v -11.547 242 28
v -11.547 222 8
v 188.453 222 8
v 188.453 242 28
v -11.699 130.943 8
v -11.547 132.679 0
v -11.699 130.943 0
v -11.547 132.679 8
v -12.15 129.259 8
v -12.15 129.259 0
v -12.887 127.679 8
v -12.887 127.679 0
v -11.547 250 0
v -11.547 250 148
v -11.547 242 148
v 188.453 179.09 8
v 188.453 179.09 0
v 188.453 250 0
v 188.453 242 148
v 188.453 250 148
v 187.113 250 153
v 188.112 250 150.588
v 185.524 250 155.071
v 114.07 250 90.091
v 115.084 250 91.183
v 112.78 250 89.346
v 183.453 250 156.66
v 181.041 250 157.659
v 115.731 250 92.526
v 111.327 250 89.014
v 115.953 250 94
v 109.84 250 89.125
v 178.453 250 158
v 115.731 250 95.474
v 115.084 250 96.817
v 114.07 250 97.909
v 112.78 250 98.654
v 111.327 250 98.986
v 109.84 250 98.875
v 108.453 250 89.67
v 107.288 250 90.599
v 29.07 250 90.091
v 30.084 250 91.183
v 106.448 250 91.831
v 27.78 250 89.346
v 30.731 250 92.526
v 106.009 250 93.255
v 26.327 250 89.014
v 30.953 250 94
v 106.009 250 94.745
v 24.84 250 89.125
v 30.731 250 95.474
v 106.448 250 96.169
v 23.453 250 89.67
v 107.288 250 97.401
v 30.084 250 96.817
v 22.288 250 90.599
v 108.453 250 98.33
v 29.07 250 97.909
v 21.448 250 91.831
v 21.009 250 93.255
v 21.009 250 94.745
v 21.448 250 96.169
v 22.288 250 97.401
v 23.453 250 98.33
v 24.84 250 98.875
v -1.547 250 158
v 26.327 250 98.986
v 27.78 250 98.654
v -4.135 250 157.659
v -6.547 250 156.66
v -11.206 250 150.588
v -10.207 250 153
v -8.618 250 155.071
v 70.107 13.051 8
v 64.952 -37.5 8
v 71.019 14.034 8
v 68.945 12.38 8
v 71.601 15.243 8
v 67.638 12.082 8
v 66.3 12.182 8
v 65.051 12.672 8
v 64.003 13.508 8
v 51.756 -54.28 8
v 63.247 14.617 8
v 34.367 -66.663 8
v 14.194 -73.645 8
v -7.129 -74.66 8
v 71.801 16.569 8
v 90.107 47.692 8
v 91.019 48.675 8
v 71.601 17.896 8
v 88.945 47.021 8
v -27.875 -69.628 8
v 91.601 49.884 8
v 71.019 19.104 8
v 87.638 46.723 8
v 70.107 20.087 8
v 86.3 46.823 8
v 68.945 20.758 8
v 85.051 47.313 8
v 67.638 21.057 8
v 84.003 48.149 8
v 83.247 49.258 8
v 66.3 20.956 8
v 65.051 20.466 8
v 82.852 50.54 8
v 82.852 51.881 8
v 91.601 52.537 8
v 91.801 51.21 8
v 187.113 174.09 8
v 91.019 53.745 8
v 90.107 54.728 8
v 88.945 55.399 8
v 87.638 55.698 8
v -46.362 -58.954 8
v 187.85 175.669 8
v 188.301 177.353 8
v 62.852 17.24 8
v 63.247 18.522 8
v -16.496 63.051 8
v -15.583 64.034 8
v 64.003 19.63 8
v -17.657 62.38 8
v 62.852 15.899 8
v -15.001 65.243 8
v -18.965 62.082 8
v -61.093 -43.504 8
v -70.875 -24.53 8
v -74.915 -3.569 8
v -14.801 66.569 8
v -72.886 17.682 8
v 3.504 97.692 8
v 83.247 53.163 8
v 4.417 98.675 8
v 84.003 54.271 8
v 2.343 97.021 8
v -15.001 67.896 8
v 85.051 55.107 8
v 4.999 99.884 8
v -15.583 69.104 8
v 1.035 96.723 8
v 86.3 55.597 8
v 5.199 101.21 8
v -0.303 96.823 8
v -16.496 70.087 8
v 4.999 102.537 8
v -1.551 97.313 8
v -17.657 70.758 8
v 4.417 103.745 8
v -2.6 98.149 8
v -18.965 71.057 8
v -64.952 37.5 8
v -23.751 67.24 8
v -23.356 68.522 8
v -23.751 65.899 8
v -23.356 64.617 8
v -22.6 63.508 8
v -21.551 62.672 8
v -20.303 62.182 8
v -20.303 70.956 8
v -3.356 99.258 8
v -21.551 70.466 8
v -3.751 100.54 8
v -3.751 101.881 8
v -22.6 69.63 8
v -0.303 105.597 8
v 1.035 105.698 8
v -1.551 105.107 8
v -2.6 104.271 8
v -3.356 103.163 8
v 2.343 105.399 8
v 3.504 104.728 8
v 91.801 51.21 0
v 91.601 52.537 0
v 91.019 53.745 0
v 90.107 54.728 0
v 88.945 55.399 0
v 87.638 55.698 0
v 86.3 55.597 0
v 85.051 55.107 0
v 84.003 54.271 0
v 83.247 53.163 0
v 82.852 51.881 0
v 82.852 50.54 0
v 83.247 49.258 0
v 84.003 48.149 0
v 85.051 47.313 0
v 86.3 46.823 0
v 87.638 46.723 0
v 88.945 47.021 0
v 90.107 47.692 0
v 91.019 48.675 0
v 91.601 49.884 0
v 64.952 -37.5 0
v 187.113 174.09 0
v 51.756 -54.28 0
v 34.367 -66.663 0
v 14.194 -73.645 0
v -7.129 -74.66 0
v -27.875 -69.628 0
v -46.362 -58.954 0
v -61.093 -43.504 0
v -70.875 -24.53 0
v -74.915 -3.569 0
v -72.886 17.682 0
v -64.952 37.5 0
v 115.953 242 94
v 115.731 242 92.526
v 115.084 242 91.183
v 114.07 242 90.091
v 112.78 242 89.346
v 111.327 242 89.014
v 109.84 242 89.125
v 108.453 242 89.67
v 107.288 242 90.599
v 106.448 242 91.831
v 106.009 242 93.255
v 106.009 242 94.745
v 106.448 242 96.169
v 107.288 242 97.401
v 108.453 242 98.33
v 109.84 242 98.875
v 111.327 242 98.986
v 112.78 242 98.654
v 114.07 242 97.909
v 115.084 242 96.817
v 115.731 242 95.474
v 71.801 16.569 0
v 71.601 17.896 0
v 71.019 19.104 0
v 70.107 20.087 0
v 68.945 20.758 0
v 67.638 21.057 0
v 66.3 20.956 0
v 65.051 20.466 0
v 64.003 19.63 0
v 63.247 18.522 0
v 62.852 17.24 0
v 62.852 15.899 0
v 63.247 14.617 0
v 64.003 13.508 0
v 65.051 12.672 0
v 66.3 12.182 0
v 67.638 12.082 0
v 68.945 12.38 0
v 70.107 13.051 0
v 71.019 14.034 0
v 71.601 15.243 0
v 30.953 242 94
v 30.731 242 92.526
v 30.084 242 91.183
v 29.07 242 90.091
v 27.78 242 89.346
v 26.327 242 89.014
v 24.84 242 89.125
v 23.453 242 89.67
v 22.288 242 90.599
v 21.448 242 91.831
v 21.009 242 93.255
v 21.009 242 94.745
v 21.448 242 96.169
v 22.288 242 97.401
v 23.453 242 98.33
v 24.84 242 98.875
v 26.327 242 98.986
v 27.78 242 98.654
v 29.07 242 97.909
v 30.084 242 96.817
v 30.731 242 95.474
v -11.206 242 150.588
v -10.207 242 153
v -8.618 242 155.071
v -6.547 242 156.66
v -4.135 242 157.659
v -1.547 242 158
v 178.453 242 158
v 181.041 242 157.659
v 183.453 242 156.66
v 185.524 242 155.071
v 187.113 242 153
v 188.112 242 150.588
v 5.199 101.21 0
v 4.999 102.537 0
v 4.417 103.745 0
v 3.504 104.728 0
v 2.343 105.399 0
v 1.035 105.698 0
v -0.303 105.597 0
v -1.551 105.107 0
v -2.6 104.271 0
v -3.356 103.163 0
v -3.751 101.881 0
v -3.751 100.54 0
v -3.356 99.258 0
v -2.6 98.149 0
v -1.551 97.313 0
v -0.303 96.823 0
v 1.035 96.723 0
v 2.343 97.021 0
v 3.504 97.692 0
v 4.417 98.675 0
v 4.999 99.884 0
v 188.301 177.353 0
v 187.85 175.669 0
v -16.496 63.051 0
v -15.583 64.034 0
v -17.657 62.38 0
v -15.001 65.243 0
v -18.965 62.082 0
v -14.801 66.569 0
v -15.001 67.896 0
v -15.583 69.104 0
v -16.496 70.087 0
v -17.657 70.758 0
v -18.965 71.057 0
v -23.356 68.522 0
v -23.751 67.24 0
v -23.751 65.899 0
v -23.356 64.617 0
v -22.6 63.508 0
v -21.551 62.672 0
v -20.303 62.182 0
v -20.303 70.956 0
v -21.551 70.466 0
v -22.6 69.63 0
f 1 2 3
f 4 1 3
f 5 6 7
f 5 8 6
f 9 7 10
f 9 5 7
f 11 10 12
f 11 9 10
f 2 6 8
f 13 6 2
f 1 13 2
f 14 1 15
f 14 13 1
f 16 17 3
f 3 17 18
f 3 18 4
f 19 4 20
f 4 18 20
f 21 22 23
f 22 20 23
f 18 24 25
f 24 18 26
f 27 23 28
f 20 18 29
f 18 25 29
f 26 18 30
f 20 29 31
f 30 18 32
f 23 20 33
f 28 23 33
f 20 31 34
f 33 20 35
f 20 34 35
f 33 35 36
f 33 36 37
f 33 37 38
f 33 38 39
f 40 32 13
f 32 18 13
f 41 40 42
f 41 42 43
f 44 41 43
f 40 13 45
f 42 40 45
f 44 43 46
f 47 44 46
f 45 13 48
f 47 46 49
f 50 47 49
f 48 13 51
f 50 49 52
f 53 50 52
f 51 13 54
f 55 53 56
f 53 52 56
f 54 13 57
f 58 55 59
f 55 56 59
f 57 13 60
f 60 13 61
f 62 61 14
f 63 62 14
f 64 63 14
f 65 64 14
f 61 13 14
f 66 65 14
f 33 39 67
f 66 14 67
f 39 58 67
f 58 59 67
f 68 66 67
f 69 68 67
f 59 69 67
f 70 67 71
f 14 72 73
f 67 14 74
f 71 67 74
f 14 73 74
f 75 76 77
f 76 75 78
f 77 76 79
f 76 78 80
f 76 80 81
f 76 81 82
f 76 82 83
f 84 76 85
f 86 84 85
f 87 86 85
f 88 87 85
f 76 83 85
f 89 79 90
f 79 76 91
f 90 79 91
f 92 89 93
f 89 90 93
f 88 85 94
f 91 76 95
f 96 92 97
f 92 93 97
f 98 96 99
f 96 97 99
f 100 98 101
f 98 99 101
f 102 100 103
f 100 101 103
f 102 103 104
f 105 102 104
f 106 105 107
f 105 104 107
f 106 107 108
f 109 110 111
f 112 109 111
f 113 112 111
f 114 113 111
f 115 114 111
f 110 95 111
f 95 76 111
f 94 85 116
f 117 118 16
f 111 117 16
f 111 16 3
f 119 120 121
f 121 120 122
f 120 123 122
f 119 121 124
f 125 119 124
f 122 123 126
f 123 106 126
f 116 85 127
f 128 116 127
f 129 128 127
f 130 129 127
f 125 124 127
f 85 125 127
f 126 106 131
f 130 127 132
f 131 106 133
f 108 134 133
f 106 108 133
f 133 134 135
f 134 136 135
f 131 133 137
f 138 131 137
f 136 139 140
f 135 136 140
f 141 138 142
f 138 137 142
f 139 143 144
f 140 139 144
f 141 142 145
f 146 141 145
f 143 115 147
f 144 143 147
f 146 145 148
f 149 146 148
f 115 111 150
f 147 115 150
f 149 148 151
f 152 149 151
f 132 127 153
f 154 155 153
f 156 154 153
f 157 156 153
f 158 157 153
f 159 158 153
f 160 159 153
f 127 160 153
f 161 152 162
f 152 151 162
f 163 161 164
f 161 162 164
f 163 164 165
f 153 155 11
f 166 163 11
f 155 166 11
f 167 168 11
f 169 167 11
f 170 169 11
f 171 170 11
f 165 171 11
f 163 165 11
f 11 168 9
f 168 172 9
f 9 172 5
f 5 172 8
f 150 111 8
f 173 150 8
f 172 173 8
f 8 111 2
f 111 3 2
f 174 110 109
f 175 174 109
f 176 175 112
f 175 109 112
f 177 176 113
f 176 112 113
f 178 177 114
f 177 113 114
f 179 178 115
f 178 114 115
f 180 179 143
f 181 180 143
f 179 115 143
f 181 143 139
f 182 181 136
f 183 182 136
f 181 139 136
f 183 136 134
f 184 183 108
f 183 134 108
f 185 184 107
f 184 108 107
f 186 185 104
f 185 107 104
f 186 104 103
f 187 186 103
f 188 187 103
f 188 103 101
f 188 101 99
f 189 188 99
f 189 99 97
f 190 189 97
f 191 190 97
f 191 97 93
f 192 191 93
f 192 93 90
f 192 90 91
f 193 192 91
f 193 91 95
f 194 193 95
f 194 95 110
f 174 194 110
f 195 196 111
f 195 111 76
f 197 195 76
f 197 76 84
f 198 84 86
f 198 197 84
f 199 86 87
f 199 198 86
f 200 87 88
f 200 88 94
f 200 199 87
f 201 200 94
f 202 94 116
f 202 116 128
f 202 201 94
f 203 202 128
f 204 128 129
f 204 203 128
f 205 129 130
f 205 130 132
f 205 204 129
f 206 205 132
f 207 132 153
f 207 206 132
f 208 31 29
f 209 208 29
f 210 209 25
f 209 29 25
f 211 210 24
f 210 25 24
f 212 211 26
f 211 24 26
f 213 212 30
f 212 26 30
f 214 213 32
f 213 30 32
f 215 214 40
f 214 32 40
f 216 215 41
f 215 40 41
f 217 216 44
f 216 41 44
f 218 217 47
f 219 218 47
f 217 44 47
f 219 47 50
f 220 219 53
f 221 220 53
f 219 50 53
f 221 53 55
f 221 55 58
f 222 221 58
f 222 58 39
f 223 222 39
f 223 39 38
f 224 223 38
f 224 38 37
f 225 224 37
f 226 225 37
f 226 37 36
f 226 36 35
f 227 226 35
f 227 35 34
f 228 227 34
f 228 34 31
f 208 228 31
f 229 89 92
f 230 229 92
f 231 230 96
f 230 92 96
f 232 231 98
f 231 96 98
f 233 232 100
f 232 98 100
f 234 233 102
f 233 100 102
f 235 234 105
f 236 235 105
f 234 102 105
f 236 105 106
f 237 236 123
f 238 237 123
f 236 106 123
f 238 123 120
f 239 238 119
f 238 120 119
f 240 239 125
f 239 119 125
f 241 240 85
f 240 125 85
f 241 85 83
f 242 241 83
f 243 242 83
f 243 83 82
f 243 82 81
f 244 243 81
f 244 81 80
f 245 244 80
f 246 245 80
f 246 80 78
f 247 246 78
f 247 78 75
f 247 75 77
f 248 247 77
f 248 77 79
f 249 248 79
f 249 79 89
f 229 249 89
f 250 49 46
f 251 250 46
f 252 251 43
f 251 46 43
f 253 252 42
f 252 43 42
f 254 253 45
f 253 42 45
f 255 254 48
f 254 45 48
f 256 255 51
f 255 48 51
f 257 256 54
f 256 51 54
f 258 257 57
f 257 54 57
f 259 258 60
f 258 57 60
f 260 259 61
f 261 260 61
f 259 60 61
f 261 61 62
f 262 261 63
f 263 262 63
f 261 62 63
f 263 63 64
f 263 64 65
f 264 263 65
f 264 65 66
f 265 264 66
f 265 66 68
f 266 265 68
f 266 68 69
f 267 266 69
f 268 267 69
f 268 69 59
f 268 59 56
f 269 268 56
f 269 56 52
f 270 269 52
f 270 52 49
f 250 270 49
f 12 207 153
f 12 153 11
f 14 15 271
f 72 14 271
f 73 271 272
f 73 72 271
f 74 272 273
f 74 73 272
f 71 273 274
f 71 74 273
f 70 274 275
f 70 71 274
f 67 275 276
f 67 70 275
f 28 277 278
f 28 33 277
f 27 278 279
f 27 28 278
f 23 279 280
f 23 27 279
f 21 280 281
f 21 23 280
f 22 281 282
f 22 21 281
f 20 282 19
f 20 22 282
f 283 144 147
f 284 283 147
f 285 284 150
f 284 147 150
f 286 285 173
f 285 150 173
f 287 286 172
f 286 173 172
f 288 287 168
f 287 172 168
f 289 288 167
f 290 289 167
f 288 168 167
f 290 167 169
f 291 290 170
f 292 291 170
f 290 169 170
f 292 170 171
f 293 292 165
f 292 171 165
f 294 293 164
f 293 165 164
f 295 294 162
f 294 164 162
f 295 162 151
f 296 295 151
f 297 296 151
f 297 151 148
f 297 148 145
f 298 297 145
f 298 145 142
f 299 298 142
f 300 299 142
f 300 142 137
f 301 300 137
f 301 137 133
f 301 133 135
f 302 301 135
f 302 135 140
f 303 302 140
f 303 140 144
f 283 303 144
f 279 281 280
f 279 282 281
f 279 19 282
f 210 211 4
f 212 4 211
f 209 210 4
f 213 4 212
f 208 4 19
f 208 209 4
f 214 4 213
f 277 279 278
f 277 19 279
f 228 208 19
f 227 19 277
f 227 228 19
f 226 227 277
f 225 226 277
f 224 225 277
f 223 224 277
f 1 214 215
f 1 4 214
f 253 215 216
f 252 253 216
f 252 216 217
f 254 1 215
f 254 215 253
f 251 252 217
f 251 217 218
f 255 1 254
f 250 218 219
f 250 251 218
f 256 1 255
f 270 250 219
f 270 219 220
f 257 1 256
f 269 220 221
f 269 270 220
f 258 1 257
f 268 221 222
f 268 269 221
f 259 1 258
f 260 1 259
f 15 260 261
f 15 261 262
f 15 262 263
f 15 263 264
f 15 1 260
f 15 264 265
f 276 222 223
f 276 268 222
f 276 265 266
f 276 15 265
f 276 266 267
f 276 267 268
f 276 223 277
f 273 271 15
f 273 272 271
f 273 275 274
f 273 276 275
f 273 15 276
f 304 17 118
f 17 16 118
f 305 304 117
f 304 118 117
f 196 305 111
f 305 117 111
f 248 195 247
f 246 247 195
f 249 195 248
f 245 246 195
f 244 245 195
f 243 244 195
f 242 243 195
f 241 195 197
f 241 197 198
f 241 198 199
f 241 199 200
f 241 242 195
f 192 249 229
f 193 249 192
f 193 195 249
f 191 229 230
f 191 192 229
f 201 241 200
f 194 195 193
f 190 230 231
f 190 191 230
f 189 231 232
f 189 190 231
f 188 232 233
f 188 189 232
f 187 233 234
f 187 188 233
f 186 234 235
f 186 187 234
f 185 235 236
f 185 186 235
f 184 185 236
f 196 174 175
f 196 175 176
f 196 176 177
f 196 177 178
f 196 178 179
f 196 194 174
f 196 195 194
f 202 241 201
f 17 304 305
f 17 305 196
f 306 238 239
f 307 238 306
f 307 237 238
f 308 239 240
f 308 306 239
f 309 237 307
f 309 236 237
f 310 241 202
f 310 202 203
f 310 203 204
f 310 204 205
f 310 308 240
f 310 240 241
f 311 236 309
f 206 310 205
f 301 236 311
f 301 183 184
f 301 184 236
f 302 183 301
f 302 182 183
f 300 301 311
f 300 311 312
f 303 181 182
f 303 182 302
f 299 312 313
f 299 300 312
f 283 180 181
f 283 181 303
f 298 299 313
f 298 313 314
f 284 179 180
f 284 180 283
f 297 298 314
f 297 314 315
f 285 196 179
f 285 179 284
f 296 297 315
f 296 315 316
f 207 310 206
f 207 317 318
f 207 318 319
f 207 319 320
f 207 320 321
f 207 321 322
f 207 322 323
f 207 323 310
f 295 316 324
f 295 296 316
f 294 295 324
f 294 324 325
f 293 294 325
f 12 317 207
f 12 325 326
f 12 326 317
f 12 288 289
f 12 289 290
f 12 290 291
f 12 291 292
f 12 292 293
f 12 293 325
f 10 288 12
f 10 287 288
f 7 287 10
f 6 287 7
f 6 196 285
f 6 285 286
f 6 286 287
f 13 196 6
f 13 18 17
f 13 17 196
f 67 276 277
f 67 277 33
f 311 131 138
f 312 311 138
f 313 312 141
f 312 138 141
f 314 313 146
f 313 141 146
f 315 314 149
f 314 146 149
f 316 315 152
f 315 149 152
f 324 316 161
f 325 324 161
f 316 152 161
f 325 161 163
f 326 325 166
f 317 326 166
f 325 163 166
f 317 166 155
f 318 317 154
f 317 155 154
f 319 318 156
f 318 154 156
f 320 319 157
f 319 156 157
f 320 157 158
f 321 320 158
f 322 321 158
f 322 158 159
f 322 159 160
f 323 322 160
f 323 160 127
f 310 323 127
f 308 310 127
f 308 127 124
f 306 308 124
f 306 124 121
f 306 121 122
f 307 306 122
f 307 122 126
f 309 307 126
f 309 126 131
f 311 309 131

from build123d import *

# Parameters (mm, degrees)
BOSS_EXTRUDE1_DEPTH = 8
SKETCH4_W           = 150
SKETCH4_H           = 8
BOSS_EXTRUDE2_DEPTH = 200
CHAMFER1_SIZE       = 20
CUT_EXTRUDE1_REACH  = 327
SKETCH5_R           = 5
CUT_EXTRUDE2_REACH  = 10
SKETCH6_R           = 4.5
FILLET1_R           = 10


with BuildPart() as part:
    # Sketch1 → Boss-Extrude1 (new body)
    with BuildSketch(Plane.XY):
        with BuildLine():
            Line((-64.951905284, 37.5), (-11.547005384, 130))
            Line((-11.547005384, 130), (-11.547005384, 250))
            Line((-11.547005384, 250), (188.452994616, 250))
            Line((188.452994616, 250), (188.452994616, 176.410161514))
            Line((188.452994616, 176.410161514), (64.951905284, -37.5))
            ThreePointArc((64.951905284, -37.5), (-37.5, -64.951905284), (-64.951905284, 37.5))
        make_face()
    extrude(amount=BOSS_EXTRUDE1_DEPTH)

    # Sketch4 → Boss-Extrude2 (add)
    with BuildSketch(Plane.ZY.offset(11.547005384)):
        with Locations((83, 246)):
            Rectangle(SKETCH4_W, SKETCH4_H)
    extrude(amount=-BOSS_EXTRUDE2_DEPTH)

    # Chamfer1
    chamfer1_edges = [part.edges().sort_by_distance(p)[0] for p in [
        (88.452994616, 242, 8),
    ]]
    chamfer(chamfer1_edges, length=CHAMFER1_SIZE)

    # Sketch5 → Cut-Extrude1 (cut, up to next)
    with BuildSketch(Plane(origin=(0, 250, 0), x_dir=(1, 0, 0), z_dir=(0, 1, 0)), mode=Mode.PRIVATE) as cut_extrude1_sk1:
        with Locations((25.952994616, -94)):
            Circle(SKETCH5_R)
    cut_extrude1_tool1 = extrude(cut_extrude1_sk1.sketch, amount=-CUT_EXTRUDE1_REACH, mode=Mode.PRIVATE) & part.part
    add(cut_extrude1_tool1.solids().sort_by_distance((25.952995, 250, 94))[0], mode=Mode.SUBTRACT)
    # Sketch5 → Cut-Extrude1 (cut, up to next)
    with BuildSketch(Plane(origin=(0, 250, 0), x_dir=(1, 0, 0), z_dir=(0, 1, 0)), mode=Mode.PRIVATE) as cut_extrude1_sk2:
        with Locations((110.952994616, -94)):
            Circle(SKETCH5_R)
    cut_extrude1_tool2 = extrude(cut_extrude1_sk2.sketch, amount=-CUT_EXTRUDE1_REACH, mode=Mode.PRIVATE) & part.part
    add(cut_extrude1_tool2.solids().sort_by_distance((110.952995, 250, 94))[0], mode=Mode.SUBTRACT)

    # Sketch6 → Cut-Extrude2 (cut, up to next)
    with BuildSketch(Plane.XY.offset(8), mode=Mode.PRIVATE) as cut_extrude2_sk1:
        with Locations((0.698729811, 101.210235533)):
            Circle(SKETCH6_R)
    cut_extrude2_tool1 = extrude(cut_extrude2_sk1.sketch, amount=-CUT_EXTRUDE2_REACH, mode=Mode.PRIVATE) & part.part
    add(cut_extrude2_tool1.solids().sort_by_distance((0.69873, 101.210236, 8))[0], mode=Mode.SUBTRACT)
    # Sketch6 → Cut-Extrude2 (cut, up to next)
    with BuildSketch(Plane.XY.offset(8), mode=Mode.PRIVATE) as cut_extrude2_sk2:
        with Locations((87.301270189, 51.210235533)):
            Circle(SKETCH6_R)
    cut_extrude2_tool2 = extrude(cut_extrude2_sk2.sketch, amount=-CUT_EXTRUDE2_REACH, mode=Mode.PRIVATE) & part.part
    add(cut_extrude2_tool2.solids().sort_by_distance((87.30127, 51.210236, 8))[0], mode=Mode.SUBTRACT)
    # Sketch6 → Cut-Extrude2 (cut, up to next)
    with BuildSketch(Plane.XY.offset(8), mode=Mode.PRIVATE) as cut_extrude2_sk3:
        with Locations((67.301270189, 16.569219382)):
            Circle(SKETCH6_R)
    cut_extrude2_tool3 = extrude(cut_extrude2_sk3.sketch, amount=-CUT_EXTRUDE2_REACH, mode=Mode.PRIVATE) & part.part
    add(cut_extrude2_tool3.solids().sort_by_distance((67.30127, 16.569219, 8))[0], mode=Mode.SUBTRACT)
    # Sketch6 → Cut-Extrude2 (cut, up to next)
    with BuildSketch(Plane.XY.offset(8), mode=Mode.PRIVATE) as cut_extrude2_sk4:
        with Locations((-19.301270189, 66.569219382)):
            Circle(SKETCH6_R)
    cut_extrude2_tool4 = extrude(cut_extrude2_sk4.sketch, amount=-CUT_EXTRUDE2_REACH, mode=Mode.PRIVATE) & part.part
    add(cut_extrude2_tool4.solids().sort_by_distance((-19.30127, 66.569219, 8))[0], mode=Mode.SUBTRACT)

    # Fillet1
    fillet1_edges = [part.edges().sort_by_distance(p)[0] for p in [
        (-11.547005384, 130, 4),
        (188.452994616, 176.410161514, 4),
        (188.452994616, 246, 158),
        (-11.547005384, 246, 158),
    ]]
    fillet(fillet1_edges, radius=FILLET1_R)


solid = part.part
